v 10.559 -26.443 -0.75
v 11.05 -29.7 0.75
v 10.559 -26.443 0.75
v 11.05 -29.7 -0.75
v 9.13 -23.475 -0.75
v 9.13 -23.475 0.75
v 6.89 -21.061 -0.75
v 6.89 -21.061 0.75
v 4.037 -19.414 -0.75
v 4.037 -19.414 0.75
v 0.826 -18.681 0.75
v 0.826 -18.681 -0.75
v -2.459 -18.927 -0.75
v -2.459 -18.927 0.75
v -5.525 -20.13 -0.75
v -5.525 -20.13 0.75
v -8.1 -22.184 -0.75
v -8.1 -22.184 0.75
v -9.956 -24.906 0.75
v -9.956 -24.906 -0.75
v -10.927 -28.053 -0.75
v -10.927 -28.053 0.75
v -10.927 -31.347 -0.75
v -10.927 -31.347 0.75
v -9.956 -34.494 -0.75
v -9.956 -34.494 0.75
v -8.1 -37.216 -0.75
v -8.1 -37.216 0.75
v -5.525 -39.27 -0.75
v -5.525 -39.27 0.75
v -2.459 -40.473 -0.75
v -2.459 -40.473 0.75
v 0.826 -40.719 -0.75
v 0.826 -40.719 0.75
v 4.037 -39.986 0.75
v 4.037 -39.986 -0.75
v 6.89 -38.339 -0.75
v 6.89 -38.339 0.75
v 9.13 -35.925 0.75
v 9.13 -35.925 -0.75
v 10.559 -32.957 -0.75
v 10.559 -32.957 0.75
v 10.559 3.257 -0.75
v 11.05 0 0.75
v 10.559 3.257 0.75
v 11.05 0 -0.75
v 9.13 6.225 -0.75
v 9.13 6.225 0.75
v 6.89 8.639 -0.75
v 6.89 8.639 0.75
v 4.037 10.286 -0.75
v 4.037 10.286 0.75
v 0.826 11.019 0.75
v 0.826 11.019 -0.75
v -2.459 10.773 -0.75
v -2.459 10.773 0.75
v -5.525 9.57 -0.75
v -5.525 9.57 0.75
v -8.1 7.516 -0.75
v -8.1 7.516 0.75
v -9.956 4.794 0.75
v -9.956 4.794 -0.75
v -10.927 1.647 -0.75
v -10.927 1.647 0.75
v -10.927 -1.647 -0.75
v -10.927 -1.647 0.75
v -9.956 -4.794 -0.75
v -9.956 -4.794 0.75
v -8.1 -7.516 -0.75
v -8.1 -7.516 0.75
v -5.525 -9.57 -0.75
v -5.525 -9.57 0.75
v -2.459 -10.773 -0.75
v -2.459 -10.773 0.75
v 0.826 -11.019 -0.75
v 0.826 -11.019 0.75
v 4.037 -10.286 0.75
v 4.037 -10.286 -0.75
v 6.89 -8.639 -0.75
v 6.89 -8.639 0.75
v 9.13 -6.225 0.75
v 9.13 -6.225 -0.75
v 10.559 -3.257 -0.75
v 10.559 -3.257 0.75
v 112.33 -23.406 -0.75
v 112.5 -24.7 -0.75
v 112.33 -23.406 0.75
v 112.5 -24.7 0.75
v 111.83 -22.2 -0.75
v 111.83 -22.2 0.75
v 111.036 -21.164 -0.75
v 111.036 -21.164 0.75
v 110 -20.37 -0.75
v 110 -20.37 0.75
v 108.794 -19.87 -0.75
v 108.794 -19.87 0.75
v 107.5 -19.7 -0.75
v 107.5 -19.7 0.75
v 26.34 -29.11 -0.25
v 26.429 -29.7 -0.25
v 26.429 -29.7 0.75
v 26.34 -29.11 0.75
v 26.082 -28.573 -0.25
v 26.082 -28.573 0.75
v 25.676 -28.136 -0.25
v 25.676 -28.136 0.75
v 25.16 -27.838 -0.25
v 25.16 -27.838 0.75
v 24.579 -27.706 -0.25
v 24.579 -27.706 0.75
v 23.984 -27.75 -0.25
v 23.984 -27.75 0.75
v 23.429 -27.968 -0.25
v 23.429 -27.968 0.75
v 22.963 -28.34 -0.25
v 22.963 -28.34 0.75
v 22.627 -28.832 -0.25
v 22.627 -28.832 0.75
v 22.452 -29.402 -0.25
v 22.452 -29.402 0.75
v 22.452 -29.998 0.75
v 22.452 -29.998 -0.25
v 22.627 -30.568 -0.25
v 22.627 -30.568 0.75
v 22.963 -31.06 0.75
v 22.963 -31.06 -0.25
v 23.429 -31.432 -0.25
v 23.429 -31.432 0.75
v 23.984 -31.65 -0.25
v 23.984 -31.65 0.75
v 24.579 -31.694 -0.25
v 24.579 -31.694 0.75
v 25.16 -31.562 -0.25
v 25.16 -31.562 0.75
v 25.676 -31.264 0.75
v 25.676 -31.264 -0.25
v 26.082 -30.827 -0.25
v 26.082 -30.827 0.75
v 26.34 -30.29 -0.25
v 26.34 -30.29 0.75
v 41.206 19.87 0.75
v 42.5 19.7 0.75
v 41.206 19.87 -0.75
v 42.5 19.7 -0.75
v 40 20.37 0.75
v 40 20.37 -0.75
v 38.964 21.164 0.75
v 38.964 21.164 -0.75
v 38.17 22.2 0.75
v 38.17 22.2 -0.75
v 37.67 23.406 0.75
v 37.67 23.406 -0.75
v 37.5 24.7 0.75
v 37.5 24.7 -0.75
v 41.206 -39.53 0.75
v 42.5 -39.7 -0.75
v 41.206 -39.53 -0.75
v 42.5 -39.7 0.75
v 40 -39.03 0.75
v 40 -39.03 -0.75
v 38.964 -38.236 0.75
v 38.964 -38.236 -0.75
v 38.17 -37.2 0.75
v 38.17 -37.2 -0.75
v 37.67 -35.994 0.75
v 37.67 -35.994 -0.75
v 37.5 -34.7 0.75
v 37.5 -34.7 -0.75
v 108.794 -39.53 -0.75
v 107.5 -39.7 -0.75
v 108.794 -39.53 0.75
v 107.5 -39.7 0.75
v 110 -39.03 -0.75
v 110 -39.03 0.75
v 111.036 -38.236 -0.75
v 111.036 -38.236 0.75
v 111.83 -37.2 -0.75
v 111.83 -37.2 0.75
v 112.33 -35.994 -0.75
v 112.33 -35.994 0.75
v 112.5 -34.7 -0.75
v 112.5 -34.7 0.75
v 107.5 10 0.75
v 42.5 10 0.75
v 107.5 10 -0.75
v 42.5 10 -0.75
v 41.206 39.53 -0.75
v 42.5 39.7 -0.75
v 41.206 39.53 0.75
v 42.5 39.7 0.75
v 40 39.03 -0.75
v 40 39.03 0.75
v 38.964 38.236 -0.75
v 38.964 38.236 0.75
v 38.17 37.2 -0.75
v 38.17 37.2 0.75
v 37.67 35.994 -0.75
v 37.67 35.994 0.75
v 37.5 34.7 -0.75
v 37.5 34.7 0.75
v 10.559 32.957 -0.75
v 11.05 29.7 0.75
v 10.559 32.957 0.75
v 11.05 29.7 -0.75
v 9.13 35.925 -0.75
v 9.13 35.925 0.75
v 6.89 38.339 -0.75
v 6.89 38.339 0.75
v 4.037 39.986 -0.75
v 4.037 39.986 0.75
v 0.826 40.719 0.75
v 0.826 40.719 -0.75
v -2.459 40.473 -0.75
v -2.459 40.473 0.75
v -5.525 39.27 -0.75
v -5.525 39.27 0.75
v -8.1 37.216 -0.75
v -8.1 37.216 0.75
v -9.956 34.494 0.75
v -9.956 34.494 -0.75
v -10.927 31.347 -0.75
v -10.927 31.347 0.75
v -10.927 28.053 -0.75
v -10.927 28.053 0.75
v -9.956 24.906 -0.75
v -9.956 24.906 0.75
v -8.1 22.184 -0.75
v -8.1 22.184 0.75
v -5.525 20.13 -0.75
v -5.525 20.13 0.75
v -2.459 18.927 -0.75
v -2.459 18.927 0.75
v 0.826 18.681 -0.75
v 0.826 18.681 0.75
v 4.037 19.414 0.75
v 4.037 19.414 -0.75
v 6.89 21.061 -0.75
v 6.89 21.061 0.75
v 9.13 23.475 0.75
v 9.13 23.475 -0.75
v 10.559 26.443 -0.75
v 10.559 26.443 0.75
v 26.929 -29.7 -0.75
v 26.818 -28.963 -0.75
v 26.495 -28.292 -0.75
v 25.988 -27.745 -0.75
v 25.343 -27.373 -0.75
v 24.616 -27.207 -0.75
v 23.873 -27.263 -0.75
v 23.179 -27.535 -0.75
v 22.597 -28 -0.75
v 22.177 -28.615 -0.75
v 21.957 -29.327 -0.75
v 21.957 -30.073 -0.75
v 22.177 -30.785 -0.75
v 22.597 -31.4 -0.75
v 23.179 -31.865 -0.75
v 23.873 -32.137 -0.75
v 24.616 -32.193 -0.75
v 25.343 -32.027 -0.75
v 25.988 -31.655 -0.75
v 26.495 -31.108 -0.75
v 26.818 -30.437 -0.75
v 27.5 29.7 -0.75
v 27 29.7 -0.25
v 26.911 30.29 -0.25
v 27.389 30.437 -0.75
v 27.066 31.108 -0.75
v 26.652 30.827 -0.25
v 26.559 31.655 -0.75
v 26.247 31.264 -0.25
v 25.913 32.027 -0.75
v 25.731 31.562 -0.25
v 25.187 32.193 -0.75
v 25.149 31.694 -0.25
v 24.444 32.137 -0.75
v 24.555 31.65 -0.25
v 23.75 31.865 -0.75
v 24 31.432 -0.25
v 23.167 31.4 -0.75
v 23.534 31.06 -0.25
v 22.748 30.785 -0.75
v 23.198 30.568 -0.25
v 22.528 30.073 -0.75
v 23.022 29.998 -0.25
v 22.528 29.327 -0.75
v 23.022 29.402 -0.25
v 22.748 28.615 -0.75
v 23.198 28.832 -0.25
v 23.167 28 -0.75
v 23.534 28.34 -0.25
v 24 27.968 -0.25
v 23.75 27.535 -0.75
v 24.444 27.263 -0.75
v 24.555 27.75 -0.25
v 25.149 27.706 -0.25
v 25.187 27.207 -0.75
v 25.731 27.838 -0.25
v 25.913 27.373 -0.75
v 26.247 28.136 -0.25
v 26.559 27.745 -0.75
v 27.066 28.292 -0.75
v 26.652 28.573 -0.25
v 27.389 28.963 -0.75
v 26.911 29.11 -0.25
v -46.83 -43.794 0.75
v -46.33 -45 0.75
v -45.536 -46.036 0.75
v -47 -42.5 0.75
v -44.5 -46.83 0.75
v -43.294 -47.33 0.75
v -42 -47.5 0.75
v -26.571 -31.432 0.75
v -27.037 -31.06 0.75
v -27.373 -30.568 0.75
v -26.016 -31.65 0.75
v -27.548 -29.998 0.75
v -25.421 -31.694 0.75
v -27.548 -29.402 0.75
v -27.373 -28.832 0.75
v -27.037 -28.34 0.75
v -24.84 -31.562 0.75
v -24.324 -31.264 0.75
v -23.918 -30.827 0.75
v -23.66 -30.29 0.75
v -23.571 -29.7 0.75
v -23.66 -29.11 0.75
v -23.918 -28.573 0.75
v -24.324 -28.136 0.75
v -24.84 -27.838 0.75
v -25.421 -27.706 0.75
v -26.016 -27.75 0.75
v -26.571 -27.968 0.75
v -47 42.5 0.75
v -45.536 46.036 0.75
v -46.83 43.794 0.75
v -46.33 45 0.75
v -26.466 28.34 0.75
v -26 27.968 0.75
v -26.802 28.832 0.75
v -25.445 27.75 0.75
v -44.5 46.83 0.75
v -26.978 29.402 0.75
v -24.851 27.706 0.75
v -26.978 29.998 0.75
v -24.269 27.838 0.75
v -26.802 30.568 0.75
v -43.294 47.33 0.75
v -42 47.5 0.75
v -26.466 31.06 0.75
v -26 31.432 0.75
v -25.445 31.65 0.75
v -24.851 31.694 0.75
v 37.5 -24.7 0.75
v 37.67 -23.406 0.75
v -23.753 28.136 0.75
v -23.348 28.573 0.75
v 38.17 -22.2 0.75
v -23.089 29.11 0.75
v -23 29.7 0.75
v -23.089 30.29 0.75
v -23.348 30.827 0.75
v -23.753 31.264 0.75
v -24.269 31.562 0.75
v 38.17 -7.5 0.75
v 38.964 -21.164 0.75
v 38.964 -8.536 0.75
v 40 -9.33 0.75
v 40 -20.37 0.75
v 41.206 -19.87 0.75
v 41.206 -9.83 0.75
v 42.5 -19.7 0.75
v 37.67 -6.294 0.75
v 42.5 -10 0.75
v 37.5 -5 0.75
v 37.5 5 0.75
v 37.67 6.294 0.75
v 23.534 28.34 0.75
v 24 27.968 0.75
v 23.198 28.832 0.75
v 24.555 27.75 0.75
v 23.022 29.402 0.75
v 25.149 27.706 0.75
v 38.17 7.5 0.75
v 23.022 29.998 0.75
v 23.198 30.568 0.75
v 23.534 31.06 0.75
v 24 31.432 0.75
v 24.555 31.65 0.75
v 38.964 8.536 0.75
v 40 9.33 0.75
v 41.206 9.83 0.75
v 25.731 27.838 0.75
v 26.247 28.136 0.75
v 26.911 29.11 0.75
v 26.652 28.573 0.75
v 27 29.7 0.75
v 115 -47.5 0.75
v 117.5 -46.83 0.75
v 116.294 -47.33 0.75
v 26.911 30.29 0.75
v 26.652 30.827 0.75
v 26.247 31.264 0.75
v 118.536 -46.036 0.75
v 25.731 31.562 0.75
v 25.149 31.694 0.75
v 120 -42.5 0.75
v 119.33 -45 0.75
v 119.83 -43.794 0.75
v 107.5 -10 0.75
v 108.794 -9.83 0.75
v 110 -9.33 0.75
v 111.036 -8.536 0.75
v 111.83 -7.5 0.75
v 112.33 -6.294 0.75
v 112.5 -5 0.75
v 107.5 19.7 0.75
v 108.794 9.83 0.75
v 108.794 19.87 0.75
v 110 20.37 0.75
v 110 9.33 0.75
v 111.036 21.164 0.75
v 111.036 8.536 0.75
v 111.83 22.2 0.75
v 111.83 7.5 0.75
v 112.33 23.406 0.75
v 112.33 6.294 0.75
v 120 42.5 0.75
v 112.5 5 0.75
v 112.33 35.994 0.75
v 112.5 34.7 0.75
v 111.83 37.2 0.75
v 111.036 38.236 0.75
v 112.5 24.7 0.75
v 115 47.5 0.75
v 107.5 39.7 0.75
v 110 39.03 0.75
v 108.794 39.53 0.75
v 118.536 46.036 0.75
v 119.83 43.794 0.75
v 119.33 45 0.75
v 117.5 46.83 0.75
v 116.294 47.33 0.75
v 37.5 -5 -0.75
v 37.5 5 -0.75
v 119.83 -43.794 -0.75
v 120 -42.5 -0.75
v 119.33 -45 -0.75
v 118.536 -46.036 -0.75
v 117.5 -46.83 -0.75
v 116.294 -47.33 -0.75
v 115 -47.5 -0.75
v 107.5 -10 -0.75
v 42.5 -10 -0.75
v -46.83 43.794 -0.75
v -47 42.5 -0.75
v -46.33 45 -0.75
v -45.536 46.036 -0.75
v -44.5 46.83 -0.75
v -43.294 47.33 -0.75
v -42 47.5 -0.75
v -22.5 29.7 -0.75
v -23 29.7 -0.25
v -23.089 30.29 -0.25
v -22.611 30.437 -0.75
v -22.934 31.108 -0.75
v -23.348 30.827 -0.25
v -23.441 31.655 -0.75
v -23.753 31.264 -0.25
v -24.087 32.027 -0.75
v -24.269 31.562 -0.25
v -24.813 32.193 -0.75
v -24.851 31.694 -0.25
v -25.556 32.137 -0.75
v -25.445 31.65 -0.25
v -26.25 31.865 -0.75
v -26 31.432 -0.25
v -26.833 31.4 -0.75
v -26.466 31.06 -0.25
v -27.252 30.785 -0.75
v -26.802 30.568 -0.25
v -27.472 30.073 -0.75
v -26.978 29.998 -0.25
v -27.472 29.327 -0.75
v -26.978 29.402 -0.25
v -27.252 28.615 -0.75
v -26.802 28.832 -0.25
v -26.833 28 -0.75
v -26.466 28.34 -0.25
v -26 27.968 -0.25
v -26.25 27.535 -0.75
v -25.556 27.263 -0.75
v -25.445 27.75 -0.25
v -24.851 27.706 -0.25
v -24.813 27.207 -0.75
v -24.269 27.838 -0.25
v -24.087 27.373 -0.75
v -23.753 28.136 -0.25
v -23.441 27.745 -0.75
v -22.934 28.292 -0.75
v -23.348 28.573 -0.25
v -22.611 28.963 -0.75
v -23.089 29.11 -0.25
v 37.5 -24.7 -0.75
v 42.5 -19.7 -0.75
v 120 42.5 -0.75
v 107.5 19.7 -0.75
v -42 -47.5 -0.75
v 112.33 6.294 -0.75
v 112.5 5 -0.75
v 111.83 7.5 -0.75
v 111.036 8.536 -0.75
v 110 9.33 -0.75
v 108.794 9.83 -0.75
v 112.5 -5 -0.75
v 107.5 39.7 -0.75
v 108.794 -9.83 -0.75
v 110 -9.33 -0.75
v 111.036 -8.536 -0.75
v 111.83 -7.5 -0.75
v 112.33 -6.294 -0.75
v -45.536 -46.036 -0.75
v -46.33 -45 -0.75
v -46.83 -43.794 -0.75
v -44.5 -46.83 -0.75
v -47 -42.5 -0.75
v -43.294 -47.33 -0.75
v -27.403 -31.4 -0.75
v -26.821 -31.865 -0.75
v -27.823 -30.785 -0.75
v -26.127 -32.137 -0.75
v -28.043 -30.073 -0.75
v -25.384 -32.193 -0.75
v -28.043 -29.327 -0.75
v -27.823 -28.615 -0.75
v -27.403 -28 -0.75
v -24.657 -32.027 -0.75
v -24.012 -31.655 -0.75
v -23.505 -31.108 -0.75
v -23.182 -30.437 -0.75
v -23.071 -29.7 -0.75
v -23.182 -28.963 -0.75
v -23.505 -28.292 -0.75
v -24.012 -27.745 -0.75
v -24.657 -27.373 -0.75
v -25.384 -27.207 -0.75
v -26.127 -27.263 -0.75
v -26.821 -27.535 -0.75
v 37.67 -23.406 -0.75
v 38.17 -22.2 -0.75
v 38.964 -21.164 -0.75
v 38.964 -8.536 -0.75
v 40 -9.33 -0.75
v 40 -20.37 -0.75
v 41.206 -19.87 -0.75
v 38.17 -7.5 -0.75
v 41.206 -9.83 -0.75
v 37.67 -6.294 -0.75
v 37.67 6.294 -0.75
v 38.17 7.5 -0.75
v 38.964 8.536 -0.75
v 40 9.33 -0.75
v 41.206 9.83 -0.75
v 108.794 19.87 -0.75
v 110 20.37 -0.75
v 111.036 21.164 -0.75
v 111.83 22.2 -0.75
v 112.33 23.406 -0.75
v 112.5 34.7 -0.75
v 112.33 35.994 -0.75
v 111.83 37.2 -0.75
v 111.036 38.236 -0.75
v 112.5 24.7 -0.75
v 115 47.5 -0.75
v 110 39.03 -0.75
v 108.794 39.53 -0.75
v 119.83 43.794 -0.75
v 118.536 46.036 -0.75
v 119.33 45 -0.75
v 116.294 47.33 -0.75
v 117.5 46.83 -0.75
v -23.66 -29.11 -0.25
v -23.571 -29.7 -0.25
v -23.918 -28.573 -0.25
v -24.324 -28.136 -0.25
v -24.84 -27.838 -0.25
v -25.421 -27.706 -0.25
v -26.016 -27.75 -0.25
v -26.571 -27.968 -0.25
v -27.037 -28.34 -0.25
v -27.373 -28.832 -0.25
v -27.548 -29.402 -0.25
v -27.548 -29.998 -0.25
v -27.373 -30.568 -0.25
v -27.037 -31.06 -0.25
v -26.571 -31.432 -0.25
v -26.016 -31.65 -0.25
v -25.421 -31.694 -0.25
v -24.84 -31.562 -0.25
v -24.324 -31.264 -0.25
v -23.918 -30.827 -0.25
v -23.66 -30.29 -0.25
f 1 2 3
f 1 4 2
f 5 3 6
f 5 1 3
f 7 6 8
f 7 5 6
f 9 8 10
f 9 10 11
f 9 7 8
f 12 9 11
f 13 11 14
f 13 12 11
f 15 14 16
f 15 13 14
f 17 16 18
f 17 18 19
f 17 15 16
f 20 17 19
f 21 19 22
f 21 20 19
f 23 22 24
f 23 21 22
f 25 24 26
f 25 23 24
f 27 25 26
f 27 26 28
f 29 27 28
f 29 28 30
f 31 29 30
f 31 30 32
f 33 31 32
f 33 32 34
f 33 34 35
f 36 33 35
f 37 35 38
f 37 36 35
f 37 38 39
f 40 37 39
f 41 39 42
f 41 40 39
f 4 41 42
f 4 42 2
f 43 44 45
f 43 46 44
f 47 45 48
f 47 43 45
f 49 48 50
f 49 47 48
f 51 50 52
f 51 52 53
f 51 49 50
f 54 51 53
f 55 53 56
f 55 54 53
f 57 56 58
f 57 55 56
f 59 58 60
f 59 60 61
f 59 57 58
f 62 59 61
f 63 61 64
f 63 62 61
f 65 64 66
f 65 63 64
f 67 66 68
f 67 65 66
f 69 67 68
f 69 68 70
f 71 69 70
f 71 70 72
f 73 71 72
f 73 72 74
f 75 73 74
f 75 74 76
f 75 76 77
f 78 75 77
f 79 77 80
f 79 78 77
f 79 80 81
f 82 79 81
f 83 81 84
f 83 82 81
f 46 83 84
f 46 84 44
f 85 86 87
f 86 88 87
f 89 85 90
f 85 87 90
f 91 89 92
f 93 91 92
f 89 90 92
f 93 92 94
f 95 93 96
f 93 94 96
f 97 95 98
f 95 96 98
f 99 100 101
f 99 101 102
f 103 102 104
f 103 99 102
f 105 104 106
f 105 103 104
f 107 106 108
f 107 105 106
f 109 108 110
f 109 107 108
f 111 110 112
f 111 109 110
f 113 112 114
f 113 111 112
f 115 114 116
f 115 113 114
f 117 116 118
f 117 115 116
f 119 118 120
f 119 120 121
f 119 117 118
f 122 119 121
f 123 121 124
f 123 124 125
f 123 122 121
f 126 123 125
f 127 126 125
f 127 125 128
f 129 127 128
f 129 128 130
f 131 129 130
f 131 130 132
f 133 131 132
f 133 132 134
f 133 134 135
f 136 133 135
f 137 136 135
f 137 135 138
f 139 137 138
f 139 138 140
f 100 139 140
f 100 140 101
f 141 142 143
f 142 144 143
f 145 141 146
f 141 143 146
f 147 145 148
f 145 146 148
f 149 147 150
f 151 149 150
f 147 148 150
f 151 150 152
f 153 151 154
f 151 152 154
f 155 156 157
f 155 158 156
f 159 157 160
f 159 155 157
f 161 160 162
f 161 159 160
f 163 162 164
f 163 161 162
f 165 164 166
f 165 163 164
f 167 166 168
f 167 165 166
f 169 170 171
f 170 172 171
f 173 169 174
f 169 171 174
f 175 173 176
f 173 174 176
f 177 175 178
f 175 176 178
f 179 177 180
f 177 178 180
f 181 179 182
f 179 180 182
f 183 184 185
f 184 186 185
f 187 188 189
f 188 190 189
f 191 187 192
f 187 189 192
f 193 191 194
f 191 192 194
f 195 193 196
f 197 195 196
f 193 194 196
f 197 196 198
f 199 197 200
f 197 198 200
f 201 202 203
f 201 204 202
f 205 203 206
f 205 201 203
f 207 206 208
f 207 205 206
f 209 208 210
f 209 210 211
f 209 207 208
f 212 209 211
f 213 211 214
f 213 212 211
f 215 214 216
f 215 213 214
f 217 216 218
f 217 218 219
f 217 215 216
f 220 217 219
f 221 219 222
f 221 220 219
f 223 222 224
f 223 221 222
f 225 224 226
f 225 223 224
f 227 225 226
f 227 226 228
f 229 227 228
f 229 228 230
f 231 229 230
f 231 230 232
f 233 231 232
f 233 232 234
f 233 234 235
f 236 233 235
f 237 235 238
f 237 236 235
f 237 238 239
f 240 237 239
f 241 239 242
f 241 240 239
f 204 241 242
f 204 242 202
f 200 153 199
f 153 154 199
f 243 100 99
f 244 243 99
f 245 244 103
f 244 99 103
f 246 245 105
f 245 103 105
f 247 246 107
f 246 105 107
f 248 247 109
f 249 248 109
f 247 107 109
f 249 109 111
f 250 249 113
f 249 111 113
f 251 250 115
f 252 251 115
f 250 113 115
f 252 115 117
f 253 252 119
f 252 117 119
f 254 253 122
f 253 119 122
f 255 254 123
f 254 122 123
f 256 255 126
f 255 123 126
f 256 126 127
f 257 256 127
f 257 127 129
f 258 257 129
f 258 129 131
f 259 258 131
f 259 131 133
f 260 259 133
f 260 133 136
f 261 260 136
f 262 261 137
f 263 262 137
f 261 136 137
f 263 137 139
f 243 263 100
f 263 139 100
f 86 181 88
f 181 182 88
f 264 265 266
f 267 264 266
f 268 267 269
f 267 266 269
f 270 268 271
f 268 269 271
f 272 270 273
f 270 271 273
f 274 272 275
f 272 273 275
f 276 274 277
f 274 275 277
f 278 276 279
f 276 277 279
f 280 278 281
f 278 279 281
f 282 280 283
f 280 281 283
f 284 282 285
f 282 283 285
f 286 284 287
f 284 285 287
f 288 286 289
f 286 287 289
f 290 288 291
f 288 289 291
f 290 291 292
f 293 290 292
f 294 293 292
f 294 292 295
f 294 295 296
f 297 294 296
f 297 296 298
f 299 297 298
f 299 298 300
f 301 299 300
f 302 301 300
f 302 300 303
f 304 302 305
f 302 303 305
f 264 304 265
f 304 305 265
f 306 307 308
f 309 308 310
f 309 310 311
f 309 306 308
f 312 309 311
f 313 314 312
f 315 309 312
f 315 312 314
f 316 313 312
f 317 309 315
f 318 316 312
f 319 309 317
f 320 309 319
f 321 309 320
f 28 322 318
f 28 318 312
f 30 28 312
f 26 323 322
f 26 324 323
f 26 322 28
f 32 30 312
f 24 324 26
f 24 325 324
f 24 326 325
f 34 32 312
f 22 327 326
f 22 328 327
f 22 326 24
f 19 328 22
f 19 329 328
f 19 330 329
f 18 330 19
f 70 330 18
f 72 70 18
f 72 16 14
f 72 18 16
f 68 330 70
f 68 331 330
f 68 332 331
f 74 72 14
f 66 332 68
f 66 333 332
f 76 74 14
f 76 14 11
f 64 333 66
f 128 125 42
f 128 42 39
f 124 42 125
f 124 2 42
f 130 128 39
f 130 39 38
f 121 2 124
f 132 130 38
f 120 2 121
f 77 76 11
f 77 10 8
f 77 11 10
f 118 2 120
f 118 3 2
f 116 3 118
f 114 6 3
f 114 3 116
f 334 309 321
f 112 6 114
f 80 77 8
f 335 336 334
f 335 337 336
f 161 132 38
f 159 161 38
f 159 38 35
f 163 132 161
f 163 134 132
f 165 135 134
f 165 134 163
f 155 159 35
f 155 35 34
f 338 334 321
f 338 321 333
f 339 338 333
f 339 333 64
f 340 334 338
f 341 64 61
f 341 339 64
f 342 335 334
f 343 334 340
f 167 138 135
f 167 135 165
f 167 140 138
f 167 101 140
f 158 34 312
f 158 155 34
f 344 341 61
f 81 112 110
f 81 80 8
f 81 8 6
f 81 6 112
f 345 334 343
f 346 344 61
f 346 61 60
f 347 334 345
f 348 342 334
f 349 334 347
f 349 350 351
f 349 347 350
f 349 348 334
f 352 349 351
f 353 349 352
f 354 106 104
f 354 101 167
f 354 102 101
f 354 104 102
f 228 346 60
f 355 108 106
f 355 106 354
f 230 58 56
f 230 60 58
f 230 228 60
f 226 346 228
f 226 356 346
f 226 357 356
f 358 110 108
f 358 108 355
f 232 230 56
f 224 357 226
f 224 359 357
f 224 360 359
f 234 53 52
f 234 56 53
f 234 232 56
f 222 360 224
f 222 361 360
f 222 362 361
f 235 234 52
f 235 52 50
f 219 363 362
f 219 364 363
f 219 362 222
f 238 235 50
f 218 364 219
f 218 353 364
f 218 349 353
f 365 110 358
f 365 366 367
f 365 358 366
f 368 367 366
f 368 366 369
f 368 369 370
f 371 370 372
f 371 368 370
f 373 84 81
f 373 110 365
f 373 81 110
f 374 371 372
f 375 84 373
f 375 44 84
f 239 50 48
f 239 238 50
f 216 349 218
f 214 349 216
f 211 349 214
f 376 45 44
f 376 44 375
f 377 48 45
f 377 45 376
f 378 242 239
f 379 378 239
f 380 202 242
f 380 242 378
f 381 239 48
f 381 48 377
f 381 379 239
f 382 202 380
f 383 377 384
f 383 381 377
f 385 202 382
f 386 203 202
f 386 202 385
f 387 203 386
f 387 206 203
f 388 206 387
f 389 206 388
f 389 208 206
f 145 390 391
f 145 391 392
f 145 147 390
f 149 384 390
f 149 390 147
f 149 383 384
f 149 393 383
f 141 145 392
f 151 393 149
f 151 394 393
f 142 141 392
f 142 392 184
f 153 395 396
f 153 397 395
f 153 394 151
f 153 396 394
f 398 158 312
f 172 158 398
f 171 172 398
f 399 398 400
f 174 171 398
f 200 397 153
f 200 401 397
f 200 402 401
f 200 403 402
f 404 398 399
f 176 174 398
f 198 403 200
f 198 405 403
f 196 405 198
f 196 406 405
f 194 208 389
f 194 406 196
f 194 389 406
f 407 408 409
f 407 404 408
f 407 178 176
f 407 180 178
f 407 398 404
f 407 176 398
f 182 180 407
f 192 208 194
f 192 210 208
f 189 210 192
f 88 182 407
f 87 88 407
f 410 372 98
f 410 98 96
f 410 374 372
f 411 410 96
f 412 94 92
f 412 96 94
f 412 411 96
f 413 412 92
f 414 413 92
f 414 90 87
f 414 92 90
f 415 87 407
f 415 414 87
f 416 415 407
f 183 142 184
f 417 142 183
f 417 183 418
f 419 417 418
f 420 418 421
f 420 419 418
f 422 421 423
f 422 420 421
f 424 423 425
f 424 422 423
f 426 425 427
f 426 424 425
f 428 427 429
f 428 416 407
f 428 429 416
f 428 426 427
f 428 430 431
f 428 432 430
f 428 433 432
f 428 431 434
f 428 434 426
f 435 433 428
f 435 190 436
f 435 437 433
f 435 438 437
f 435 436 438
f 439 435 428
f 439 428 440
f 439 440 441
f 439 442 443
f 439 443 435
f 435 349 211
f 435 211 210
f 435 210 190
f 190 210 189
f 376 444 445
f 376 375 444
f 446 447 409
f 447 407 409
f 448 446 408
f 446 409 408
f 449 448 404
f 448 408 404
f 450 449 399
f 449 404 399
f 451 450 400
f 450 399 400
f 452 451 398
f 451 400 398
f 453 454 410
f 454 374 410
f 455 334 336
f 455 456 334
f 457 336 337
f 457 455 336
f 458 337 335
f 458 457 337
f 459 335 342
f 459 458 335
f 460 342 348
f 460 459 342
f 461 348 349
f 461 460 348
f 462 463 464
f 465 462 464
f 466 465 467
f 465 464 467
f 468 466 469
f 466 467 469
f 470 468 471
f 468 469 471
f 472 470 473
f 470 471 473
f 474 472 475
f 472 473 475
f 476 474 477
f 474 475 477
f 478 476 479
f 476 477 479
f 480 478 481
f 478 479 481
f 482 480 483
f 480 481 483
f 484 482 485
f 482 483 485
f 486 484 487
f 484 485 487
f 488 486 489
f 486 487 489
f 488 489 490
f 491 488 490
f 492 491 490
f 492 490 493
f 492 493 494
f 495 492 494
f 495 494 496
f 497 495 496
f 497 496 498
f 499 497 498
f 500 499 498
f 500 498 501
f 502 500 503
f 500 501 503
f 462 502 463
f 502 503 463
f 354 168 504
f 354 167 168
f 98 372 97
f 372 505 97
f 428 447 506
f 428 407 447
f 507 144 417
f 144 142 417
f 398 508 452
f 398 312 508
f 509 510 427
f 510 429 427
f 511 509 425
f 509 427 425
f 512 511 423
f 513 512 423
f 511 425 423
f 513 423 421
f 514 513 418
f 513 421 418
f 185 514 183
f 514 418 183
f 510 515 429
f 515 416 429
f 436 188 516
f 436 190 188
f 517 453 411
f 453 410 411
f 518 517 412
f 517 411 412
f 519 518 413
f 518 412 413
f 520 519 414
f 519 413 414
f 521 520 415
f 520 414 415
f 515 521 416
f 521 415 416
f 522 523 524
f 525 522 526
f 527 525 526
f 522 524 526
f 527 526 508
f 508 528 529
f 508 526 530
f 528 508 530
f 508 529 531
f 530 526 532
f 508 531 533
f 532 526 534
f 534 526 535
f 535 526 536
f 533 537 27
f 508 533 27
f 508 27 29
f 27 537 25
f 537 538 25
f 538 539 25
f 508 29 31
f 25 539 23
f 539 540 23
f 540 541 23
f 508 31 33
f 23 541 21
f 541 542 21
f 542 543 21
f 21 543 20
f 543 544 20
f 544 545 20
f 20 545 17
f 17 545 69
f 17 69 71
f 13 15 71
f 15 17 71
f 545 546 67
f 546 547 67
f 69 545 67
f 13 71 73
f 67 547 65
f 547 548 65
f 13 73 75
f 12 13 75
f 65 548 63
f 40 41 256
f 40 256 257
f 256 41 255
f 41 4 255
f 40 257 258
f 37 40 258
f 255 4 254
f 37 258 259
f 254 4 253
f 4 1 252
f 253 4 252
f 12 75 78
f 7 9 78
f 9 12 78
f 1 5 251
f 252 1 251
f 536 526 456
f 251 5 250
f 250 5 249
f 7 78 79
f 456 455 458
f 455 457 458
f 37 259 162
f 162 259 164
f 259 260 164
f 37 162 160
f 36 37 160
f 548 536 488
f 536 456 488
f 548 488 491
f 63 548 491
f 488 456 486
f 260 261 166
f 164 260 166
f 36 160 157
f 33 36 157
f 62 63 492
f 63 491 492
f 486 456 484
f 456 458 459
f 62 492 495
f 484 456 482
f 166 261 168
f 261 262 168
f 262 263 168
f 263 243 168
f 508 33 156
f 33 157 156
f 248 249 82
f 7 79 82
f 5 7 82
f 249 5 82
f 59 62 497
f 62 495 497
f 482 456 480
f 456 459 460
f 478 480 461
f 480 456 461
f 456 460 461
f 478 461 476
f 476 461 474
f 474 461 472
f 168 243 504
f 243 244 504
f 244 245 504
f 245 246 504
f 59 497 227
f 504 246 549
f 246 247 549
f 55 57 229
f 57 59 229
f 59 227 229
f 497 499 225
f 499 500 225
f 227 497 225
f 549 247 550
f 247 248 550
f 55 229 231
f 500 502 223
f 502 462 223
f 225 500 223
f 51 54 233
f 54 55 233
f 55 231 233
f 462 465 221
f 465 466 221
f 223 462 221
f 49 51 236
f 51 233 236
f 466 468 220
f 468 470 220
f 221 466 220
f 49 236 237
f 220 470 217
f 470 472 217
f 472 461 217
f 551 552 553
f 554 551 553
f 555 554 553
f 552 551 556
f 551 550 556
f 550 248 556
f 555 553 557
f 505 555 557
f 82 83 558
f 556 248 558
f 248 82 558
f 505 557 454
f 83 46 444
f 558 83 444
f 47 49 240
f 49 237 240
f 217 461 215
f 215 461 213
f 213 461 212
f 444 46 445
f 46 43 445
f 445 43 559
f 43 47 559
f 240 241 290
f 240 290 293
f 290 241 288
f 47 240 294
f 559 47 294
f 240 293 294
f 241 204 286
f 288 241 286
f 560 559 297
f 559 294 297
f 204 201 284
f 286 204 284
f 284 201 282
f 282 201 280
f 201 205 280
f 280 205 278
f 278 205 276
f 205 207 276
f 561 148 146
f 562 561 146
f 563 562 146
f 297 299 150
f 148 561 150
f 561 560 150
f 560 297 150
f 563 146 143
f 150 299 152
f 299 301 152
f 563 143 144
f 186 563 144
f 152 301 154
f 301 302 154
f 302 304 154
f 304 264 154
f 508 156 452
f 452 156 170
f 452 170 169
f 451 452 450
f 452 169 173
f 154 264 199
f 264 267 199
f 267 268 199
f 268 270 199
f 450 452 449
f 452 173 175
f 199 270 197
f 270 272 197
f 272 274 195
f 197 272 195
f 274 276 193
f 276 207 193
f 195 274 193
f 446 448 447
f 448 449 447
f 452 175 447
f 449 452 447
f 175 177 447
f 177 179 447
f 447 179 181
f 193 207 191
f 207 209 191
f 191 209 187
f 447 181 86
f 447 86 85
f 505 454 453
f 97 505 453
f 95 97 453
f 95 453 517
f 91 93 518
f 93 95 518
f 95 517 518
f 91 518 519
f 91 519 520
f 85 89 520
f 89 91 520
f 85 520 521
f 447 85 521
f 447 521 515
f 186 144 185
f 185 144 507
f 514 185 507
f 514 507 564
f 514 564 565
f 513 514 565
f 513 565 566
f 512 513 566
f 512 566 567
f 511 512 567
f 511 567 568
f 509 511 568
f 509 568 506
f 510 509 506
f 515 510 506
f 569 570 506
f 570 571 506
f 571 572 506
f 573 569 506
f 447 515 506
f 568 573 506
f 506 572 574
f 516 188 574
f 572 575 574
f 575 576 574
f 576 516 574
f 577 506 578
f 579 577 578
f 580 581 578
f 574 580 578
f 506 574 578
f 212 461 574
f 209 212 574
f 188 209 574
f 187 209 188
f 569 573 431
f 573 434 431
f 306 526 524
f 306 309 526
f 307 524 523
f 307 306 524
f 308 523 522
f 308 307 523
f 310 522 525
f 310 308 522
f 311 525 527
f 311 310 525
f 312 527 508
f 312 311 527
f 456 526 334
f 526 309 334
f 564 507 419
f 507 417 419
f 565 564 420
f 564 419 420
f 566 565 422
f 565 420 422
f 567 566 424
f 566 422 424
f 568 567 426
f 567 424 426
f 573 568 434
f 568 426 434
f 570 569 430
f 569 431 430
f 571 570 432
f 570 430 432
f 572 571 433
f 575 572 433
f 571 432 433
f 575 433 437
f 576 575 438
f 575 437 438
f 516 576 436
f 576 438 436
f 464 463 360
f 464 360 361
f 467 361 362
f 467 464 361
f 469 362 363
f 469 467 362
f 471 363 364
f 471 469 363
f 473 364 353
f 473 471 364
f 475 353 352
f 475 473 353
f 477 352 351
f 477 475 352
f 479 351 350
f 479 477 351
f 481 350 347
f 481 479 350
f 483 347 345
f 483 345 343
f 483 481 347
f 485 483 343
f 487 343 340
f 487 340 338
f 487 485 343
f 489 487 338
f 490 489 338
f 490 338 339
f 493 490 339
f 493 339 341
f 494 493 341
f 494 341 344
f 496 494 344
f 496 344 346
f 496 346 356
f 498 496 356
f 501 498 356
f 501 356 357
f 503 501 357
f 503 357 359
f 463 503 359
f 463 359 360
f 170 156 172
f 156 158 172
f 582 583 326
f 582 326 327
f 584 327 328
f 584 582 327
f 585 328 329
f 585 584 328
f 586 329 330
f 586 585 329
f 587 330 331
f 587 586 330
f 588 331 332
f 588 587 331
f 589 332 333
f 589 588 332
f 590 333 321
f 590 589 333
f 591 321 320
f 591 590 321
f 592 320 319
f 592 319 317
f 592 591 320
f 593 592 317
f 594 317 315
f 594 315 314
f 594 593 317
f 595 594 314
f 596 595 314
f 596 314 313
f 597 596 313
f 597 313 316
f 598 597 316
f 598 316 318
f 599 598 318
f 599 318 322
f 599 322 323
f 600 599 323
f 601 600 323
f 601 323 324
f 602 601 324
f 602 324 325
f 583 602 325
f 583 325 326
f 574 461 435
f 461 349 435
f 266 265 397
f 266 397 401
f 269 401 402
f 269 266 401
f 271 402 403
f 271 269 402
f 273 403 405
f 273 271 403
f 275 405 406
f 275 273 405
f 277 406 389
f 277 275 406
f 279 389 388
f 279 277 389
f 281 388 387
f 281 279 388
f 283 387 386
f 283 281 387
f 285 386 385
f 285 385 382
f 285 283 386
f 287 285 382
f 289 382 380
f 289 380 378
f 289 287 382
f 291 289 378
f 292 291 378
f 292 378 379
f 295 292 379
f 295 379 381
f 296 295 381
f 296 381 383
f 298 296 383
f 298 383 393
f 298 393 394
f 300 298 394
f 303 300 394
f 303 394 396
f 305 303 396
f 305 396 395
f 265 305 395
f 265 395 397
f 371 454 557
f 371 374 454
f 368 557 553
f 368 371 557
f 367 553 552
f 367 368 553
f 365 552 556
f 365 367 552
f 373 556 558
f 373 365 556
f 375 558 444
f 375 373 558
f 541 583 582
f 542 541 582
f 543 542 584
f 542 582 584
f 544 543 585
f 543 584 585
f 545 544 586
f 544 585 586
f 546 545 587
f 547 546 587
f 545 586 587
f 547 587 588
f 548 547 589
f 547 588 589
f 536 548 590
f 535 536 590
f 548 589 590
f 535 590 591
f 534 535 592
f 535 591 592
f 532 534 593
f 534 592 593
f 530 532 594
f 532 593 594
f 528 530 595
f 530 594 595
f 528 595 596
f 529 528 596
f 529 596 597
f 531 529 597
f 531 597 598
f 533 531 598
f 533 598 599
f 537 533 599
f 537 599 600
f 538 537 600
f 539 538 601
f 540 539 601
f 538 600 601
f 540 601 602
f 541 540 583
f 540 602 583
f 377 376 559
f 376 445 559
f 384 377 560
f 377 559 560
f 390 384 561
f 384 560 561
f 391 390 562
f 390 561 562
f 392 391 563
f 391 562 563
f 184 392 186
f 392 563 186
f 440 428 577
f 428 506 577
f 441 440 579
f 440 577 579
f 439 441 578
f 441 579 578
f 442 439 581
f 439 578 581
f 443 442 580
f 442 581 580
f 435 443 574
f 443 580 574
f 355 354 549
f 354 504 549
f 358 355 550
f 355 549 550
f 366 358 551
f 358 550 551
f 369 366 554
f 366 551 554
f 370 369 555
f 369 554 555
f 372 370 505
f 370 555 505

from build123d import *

# Parameters (mm, degrees)
F0_W     = 167
F0_H     = 95
F0_R     = 2
F0_R_2   = 11.05
F0_W_2   = 75
F0_H_2   = 20
F1_DEPTH = 0.75
F2_R     = 5
F3_R     = 5
F4_SIZE  = 0.5


# Not quite as in the source:
# - a feature names something its author has since deleted; it is built from what else it names


with BuildPart() as f1:
    # F0 (on Top) → F1 (new body, symmetric)
    with BuildSketch(Plane.XY):
        with Locations((36.5, 0)):
            Rectangle(F0_W, F0_H)
        with Locations((-25.5706578493, -29.7)):
            Circle(F0_R, mode=Mode.SUBTRACT)
        with Locations((0, -29.7)):
            Circle(F0_R_2, mode=Mode.SUBTRACT)
        with Locations((24.4293421507, -29.7)):
            Circle(F0_R, mode=Mode.SUBTRACT)
        with Locations((75, -29.7)):
            Rectangle(F0_W_2, F0_H_2, mode=Mode.SUBTRACT)
        Circle(F0_R_2, mode=Mode.SUBTRACT)
        with Locations((-25, 29.7)):
            Circle(F0_R, mode=Mode.SUBTRACT)
        with Locations((0, 29.7)):
            Circle(F0_R_2, mode=Mode.SUBTRACT)
        with Locations((25, 29.7)):
            Circle(F0_R, mode=Mode.SUBTRACT)
        with Locations((75, 0)):
            Rectangle(F0_W_2, F0_H_2, mode=Mode.SUBTRACT)
        with Locations((75, 29.7)):
            Rectangle(F0_W_2, F0_H_2, mode=Mode.SUBTRACT)
    extrude(amount=F1_DEPTH, both=True)

    # F2
    f2_edges = [f1.edges().sort_by_distance(p)[0] for p in [
        (120, 47.5, 0),
        (120, -47.5, 0),
        (-47, -47.5, 0),
        (-47, 47.5, 0),
    ]]
    fillet(f2_edges, radius=F2_R)

    # F3
    f3_edges = [f1.edges().sort_by_distance(p)[0] for p in [
        (37.5, 39.7, 0),
        (37.5, 10, 0),
        (37.5, -19.7, 0),
        (112.5, 39.7, 0),
        (112.5, 10, 0),
        (112.5, -19.7, 0),
        (112.5, -39.7, 0),
        (112.5, -10, 0),
        (112.5, 19.7, 0),
        (37.5, -39.7, 0),
        (37.5, -10, 0),
        (37.5, 19.7, 0),
    ]]
    fillet(f3_edges, radius=F3_R)

    # F4
    f4_edges = [f1.edges().sort_by_distance(p)[0] for p in [
        (-27.570658, -29.7, -0.75),
        (22.429342, -29.7, -0.75),
        (23, 29.7, -0.75),
        (-27, 29.7, -0.75),
    ]]
    chamfer(f4_edges, length=F4_SIZE)


solid = f1.part
